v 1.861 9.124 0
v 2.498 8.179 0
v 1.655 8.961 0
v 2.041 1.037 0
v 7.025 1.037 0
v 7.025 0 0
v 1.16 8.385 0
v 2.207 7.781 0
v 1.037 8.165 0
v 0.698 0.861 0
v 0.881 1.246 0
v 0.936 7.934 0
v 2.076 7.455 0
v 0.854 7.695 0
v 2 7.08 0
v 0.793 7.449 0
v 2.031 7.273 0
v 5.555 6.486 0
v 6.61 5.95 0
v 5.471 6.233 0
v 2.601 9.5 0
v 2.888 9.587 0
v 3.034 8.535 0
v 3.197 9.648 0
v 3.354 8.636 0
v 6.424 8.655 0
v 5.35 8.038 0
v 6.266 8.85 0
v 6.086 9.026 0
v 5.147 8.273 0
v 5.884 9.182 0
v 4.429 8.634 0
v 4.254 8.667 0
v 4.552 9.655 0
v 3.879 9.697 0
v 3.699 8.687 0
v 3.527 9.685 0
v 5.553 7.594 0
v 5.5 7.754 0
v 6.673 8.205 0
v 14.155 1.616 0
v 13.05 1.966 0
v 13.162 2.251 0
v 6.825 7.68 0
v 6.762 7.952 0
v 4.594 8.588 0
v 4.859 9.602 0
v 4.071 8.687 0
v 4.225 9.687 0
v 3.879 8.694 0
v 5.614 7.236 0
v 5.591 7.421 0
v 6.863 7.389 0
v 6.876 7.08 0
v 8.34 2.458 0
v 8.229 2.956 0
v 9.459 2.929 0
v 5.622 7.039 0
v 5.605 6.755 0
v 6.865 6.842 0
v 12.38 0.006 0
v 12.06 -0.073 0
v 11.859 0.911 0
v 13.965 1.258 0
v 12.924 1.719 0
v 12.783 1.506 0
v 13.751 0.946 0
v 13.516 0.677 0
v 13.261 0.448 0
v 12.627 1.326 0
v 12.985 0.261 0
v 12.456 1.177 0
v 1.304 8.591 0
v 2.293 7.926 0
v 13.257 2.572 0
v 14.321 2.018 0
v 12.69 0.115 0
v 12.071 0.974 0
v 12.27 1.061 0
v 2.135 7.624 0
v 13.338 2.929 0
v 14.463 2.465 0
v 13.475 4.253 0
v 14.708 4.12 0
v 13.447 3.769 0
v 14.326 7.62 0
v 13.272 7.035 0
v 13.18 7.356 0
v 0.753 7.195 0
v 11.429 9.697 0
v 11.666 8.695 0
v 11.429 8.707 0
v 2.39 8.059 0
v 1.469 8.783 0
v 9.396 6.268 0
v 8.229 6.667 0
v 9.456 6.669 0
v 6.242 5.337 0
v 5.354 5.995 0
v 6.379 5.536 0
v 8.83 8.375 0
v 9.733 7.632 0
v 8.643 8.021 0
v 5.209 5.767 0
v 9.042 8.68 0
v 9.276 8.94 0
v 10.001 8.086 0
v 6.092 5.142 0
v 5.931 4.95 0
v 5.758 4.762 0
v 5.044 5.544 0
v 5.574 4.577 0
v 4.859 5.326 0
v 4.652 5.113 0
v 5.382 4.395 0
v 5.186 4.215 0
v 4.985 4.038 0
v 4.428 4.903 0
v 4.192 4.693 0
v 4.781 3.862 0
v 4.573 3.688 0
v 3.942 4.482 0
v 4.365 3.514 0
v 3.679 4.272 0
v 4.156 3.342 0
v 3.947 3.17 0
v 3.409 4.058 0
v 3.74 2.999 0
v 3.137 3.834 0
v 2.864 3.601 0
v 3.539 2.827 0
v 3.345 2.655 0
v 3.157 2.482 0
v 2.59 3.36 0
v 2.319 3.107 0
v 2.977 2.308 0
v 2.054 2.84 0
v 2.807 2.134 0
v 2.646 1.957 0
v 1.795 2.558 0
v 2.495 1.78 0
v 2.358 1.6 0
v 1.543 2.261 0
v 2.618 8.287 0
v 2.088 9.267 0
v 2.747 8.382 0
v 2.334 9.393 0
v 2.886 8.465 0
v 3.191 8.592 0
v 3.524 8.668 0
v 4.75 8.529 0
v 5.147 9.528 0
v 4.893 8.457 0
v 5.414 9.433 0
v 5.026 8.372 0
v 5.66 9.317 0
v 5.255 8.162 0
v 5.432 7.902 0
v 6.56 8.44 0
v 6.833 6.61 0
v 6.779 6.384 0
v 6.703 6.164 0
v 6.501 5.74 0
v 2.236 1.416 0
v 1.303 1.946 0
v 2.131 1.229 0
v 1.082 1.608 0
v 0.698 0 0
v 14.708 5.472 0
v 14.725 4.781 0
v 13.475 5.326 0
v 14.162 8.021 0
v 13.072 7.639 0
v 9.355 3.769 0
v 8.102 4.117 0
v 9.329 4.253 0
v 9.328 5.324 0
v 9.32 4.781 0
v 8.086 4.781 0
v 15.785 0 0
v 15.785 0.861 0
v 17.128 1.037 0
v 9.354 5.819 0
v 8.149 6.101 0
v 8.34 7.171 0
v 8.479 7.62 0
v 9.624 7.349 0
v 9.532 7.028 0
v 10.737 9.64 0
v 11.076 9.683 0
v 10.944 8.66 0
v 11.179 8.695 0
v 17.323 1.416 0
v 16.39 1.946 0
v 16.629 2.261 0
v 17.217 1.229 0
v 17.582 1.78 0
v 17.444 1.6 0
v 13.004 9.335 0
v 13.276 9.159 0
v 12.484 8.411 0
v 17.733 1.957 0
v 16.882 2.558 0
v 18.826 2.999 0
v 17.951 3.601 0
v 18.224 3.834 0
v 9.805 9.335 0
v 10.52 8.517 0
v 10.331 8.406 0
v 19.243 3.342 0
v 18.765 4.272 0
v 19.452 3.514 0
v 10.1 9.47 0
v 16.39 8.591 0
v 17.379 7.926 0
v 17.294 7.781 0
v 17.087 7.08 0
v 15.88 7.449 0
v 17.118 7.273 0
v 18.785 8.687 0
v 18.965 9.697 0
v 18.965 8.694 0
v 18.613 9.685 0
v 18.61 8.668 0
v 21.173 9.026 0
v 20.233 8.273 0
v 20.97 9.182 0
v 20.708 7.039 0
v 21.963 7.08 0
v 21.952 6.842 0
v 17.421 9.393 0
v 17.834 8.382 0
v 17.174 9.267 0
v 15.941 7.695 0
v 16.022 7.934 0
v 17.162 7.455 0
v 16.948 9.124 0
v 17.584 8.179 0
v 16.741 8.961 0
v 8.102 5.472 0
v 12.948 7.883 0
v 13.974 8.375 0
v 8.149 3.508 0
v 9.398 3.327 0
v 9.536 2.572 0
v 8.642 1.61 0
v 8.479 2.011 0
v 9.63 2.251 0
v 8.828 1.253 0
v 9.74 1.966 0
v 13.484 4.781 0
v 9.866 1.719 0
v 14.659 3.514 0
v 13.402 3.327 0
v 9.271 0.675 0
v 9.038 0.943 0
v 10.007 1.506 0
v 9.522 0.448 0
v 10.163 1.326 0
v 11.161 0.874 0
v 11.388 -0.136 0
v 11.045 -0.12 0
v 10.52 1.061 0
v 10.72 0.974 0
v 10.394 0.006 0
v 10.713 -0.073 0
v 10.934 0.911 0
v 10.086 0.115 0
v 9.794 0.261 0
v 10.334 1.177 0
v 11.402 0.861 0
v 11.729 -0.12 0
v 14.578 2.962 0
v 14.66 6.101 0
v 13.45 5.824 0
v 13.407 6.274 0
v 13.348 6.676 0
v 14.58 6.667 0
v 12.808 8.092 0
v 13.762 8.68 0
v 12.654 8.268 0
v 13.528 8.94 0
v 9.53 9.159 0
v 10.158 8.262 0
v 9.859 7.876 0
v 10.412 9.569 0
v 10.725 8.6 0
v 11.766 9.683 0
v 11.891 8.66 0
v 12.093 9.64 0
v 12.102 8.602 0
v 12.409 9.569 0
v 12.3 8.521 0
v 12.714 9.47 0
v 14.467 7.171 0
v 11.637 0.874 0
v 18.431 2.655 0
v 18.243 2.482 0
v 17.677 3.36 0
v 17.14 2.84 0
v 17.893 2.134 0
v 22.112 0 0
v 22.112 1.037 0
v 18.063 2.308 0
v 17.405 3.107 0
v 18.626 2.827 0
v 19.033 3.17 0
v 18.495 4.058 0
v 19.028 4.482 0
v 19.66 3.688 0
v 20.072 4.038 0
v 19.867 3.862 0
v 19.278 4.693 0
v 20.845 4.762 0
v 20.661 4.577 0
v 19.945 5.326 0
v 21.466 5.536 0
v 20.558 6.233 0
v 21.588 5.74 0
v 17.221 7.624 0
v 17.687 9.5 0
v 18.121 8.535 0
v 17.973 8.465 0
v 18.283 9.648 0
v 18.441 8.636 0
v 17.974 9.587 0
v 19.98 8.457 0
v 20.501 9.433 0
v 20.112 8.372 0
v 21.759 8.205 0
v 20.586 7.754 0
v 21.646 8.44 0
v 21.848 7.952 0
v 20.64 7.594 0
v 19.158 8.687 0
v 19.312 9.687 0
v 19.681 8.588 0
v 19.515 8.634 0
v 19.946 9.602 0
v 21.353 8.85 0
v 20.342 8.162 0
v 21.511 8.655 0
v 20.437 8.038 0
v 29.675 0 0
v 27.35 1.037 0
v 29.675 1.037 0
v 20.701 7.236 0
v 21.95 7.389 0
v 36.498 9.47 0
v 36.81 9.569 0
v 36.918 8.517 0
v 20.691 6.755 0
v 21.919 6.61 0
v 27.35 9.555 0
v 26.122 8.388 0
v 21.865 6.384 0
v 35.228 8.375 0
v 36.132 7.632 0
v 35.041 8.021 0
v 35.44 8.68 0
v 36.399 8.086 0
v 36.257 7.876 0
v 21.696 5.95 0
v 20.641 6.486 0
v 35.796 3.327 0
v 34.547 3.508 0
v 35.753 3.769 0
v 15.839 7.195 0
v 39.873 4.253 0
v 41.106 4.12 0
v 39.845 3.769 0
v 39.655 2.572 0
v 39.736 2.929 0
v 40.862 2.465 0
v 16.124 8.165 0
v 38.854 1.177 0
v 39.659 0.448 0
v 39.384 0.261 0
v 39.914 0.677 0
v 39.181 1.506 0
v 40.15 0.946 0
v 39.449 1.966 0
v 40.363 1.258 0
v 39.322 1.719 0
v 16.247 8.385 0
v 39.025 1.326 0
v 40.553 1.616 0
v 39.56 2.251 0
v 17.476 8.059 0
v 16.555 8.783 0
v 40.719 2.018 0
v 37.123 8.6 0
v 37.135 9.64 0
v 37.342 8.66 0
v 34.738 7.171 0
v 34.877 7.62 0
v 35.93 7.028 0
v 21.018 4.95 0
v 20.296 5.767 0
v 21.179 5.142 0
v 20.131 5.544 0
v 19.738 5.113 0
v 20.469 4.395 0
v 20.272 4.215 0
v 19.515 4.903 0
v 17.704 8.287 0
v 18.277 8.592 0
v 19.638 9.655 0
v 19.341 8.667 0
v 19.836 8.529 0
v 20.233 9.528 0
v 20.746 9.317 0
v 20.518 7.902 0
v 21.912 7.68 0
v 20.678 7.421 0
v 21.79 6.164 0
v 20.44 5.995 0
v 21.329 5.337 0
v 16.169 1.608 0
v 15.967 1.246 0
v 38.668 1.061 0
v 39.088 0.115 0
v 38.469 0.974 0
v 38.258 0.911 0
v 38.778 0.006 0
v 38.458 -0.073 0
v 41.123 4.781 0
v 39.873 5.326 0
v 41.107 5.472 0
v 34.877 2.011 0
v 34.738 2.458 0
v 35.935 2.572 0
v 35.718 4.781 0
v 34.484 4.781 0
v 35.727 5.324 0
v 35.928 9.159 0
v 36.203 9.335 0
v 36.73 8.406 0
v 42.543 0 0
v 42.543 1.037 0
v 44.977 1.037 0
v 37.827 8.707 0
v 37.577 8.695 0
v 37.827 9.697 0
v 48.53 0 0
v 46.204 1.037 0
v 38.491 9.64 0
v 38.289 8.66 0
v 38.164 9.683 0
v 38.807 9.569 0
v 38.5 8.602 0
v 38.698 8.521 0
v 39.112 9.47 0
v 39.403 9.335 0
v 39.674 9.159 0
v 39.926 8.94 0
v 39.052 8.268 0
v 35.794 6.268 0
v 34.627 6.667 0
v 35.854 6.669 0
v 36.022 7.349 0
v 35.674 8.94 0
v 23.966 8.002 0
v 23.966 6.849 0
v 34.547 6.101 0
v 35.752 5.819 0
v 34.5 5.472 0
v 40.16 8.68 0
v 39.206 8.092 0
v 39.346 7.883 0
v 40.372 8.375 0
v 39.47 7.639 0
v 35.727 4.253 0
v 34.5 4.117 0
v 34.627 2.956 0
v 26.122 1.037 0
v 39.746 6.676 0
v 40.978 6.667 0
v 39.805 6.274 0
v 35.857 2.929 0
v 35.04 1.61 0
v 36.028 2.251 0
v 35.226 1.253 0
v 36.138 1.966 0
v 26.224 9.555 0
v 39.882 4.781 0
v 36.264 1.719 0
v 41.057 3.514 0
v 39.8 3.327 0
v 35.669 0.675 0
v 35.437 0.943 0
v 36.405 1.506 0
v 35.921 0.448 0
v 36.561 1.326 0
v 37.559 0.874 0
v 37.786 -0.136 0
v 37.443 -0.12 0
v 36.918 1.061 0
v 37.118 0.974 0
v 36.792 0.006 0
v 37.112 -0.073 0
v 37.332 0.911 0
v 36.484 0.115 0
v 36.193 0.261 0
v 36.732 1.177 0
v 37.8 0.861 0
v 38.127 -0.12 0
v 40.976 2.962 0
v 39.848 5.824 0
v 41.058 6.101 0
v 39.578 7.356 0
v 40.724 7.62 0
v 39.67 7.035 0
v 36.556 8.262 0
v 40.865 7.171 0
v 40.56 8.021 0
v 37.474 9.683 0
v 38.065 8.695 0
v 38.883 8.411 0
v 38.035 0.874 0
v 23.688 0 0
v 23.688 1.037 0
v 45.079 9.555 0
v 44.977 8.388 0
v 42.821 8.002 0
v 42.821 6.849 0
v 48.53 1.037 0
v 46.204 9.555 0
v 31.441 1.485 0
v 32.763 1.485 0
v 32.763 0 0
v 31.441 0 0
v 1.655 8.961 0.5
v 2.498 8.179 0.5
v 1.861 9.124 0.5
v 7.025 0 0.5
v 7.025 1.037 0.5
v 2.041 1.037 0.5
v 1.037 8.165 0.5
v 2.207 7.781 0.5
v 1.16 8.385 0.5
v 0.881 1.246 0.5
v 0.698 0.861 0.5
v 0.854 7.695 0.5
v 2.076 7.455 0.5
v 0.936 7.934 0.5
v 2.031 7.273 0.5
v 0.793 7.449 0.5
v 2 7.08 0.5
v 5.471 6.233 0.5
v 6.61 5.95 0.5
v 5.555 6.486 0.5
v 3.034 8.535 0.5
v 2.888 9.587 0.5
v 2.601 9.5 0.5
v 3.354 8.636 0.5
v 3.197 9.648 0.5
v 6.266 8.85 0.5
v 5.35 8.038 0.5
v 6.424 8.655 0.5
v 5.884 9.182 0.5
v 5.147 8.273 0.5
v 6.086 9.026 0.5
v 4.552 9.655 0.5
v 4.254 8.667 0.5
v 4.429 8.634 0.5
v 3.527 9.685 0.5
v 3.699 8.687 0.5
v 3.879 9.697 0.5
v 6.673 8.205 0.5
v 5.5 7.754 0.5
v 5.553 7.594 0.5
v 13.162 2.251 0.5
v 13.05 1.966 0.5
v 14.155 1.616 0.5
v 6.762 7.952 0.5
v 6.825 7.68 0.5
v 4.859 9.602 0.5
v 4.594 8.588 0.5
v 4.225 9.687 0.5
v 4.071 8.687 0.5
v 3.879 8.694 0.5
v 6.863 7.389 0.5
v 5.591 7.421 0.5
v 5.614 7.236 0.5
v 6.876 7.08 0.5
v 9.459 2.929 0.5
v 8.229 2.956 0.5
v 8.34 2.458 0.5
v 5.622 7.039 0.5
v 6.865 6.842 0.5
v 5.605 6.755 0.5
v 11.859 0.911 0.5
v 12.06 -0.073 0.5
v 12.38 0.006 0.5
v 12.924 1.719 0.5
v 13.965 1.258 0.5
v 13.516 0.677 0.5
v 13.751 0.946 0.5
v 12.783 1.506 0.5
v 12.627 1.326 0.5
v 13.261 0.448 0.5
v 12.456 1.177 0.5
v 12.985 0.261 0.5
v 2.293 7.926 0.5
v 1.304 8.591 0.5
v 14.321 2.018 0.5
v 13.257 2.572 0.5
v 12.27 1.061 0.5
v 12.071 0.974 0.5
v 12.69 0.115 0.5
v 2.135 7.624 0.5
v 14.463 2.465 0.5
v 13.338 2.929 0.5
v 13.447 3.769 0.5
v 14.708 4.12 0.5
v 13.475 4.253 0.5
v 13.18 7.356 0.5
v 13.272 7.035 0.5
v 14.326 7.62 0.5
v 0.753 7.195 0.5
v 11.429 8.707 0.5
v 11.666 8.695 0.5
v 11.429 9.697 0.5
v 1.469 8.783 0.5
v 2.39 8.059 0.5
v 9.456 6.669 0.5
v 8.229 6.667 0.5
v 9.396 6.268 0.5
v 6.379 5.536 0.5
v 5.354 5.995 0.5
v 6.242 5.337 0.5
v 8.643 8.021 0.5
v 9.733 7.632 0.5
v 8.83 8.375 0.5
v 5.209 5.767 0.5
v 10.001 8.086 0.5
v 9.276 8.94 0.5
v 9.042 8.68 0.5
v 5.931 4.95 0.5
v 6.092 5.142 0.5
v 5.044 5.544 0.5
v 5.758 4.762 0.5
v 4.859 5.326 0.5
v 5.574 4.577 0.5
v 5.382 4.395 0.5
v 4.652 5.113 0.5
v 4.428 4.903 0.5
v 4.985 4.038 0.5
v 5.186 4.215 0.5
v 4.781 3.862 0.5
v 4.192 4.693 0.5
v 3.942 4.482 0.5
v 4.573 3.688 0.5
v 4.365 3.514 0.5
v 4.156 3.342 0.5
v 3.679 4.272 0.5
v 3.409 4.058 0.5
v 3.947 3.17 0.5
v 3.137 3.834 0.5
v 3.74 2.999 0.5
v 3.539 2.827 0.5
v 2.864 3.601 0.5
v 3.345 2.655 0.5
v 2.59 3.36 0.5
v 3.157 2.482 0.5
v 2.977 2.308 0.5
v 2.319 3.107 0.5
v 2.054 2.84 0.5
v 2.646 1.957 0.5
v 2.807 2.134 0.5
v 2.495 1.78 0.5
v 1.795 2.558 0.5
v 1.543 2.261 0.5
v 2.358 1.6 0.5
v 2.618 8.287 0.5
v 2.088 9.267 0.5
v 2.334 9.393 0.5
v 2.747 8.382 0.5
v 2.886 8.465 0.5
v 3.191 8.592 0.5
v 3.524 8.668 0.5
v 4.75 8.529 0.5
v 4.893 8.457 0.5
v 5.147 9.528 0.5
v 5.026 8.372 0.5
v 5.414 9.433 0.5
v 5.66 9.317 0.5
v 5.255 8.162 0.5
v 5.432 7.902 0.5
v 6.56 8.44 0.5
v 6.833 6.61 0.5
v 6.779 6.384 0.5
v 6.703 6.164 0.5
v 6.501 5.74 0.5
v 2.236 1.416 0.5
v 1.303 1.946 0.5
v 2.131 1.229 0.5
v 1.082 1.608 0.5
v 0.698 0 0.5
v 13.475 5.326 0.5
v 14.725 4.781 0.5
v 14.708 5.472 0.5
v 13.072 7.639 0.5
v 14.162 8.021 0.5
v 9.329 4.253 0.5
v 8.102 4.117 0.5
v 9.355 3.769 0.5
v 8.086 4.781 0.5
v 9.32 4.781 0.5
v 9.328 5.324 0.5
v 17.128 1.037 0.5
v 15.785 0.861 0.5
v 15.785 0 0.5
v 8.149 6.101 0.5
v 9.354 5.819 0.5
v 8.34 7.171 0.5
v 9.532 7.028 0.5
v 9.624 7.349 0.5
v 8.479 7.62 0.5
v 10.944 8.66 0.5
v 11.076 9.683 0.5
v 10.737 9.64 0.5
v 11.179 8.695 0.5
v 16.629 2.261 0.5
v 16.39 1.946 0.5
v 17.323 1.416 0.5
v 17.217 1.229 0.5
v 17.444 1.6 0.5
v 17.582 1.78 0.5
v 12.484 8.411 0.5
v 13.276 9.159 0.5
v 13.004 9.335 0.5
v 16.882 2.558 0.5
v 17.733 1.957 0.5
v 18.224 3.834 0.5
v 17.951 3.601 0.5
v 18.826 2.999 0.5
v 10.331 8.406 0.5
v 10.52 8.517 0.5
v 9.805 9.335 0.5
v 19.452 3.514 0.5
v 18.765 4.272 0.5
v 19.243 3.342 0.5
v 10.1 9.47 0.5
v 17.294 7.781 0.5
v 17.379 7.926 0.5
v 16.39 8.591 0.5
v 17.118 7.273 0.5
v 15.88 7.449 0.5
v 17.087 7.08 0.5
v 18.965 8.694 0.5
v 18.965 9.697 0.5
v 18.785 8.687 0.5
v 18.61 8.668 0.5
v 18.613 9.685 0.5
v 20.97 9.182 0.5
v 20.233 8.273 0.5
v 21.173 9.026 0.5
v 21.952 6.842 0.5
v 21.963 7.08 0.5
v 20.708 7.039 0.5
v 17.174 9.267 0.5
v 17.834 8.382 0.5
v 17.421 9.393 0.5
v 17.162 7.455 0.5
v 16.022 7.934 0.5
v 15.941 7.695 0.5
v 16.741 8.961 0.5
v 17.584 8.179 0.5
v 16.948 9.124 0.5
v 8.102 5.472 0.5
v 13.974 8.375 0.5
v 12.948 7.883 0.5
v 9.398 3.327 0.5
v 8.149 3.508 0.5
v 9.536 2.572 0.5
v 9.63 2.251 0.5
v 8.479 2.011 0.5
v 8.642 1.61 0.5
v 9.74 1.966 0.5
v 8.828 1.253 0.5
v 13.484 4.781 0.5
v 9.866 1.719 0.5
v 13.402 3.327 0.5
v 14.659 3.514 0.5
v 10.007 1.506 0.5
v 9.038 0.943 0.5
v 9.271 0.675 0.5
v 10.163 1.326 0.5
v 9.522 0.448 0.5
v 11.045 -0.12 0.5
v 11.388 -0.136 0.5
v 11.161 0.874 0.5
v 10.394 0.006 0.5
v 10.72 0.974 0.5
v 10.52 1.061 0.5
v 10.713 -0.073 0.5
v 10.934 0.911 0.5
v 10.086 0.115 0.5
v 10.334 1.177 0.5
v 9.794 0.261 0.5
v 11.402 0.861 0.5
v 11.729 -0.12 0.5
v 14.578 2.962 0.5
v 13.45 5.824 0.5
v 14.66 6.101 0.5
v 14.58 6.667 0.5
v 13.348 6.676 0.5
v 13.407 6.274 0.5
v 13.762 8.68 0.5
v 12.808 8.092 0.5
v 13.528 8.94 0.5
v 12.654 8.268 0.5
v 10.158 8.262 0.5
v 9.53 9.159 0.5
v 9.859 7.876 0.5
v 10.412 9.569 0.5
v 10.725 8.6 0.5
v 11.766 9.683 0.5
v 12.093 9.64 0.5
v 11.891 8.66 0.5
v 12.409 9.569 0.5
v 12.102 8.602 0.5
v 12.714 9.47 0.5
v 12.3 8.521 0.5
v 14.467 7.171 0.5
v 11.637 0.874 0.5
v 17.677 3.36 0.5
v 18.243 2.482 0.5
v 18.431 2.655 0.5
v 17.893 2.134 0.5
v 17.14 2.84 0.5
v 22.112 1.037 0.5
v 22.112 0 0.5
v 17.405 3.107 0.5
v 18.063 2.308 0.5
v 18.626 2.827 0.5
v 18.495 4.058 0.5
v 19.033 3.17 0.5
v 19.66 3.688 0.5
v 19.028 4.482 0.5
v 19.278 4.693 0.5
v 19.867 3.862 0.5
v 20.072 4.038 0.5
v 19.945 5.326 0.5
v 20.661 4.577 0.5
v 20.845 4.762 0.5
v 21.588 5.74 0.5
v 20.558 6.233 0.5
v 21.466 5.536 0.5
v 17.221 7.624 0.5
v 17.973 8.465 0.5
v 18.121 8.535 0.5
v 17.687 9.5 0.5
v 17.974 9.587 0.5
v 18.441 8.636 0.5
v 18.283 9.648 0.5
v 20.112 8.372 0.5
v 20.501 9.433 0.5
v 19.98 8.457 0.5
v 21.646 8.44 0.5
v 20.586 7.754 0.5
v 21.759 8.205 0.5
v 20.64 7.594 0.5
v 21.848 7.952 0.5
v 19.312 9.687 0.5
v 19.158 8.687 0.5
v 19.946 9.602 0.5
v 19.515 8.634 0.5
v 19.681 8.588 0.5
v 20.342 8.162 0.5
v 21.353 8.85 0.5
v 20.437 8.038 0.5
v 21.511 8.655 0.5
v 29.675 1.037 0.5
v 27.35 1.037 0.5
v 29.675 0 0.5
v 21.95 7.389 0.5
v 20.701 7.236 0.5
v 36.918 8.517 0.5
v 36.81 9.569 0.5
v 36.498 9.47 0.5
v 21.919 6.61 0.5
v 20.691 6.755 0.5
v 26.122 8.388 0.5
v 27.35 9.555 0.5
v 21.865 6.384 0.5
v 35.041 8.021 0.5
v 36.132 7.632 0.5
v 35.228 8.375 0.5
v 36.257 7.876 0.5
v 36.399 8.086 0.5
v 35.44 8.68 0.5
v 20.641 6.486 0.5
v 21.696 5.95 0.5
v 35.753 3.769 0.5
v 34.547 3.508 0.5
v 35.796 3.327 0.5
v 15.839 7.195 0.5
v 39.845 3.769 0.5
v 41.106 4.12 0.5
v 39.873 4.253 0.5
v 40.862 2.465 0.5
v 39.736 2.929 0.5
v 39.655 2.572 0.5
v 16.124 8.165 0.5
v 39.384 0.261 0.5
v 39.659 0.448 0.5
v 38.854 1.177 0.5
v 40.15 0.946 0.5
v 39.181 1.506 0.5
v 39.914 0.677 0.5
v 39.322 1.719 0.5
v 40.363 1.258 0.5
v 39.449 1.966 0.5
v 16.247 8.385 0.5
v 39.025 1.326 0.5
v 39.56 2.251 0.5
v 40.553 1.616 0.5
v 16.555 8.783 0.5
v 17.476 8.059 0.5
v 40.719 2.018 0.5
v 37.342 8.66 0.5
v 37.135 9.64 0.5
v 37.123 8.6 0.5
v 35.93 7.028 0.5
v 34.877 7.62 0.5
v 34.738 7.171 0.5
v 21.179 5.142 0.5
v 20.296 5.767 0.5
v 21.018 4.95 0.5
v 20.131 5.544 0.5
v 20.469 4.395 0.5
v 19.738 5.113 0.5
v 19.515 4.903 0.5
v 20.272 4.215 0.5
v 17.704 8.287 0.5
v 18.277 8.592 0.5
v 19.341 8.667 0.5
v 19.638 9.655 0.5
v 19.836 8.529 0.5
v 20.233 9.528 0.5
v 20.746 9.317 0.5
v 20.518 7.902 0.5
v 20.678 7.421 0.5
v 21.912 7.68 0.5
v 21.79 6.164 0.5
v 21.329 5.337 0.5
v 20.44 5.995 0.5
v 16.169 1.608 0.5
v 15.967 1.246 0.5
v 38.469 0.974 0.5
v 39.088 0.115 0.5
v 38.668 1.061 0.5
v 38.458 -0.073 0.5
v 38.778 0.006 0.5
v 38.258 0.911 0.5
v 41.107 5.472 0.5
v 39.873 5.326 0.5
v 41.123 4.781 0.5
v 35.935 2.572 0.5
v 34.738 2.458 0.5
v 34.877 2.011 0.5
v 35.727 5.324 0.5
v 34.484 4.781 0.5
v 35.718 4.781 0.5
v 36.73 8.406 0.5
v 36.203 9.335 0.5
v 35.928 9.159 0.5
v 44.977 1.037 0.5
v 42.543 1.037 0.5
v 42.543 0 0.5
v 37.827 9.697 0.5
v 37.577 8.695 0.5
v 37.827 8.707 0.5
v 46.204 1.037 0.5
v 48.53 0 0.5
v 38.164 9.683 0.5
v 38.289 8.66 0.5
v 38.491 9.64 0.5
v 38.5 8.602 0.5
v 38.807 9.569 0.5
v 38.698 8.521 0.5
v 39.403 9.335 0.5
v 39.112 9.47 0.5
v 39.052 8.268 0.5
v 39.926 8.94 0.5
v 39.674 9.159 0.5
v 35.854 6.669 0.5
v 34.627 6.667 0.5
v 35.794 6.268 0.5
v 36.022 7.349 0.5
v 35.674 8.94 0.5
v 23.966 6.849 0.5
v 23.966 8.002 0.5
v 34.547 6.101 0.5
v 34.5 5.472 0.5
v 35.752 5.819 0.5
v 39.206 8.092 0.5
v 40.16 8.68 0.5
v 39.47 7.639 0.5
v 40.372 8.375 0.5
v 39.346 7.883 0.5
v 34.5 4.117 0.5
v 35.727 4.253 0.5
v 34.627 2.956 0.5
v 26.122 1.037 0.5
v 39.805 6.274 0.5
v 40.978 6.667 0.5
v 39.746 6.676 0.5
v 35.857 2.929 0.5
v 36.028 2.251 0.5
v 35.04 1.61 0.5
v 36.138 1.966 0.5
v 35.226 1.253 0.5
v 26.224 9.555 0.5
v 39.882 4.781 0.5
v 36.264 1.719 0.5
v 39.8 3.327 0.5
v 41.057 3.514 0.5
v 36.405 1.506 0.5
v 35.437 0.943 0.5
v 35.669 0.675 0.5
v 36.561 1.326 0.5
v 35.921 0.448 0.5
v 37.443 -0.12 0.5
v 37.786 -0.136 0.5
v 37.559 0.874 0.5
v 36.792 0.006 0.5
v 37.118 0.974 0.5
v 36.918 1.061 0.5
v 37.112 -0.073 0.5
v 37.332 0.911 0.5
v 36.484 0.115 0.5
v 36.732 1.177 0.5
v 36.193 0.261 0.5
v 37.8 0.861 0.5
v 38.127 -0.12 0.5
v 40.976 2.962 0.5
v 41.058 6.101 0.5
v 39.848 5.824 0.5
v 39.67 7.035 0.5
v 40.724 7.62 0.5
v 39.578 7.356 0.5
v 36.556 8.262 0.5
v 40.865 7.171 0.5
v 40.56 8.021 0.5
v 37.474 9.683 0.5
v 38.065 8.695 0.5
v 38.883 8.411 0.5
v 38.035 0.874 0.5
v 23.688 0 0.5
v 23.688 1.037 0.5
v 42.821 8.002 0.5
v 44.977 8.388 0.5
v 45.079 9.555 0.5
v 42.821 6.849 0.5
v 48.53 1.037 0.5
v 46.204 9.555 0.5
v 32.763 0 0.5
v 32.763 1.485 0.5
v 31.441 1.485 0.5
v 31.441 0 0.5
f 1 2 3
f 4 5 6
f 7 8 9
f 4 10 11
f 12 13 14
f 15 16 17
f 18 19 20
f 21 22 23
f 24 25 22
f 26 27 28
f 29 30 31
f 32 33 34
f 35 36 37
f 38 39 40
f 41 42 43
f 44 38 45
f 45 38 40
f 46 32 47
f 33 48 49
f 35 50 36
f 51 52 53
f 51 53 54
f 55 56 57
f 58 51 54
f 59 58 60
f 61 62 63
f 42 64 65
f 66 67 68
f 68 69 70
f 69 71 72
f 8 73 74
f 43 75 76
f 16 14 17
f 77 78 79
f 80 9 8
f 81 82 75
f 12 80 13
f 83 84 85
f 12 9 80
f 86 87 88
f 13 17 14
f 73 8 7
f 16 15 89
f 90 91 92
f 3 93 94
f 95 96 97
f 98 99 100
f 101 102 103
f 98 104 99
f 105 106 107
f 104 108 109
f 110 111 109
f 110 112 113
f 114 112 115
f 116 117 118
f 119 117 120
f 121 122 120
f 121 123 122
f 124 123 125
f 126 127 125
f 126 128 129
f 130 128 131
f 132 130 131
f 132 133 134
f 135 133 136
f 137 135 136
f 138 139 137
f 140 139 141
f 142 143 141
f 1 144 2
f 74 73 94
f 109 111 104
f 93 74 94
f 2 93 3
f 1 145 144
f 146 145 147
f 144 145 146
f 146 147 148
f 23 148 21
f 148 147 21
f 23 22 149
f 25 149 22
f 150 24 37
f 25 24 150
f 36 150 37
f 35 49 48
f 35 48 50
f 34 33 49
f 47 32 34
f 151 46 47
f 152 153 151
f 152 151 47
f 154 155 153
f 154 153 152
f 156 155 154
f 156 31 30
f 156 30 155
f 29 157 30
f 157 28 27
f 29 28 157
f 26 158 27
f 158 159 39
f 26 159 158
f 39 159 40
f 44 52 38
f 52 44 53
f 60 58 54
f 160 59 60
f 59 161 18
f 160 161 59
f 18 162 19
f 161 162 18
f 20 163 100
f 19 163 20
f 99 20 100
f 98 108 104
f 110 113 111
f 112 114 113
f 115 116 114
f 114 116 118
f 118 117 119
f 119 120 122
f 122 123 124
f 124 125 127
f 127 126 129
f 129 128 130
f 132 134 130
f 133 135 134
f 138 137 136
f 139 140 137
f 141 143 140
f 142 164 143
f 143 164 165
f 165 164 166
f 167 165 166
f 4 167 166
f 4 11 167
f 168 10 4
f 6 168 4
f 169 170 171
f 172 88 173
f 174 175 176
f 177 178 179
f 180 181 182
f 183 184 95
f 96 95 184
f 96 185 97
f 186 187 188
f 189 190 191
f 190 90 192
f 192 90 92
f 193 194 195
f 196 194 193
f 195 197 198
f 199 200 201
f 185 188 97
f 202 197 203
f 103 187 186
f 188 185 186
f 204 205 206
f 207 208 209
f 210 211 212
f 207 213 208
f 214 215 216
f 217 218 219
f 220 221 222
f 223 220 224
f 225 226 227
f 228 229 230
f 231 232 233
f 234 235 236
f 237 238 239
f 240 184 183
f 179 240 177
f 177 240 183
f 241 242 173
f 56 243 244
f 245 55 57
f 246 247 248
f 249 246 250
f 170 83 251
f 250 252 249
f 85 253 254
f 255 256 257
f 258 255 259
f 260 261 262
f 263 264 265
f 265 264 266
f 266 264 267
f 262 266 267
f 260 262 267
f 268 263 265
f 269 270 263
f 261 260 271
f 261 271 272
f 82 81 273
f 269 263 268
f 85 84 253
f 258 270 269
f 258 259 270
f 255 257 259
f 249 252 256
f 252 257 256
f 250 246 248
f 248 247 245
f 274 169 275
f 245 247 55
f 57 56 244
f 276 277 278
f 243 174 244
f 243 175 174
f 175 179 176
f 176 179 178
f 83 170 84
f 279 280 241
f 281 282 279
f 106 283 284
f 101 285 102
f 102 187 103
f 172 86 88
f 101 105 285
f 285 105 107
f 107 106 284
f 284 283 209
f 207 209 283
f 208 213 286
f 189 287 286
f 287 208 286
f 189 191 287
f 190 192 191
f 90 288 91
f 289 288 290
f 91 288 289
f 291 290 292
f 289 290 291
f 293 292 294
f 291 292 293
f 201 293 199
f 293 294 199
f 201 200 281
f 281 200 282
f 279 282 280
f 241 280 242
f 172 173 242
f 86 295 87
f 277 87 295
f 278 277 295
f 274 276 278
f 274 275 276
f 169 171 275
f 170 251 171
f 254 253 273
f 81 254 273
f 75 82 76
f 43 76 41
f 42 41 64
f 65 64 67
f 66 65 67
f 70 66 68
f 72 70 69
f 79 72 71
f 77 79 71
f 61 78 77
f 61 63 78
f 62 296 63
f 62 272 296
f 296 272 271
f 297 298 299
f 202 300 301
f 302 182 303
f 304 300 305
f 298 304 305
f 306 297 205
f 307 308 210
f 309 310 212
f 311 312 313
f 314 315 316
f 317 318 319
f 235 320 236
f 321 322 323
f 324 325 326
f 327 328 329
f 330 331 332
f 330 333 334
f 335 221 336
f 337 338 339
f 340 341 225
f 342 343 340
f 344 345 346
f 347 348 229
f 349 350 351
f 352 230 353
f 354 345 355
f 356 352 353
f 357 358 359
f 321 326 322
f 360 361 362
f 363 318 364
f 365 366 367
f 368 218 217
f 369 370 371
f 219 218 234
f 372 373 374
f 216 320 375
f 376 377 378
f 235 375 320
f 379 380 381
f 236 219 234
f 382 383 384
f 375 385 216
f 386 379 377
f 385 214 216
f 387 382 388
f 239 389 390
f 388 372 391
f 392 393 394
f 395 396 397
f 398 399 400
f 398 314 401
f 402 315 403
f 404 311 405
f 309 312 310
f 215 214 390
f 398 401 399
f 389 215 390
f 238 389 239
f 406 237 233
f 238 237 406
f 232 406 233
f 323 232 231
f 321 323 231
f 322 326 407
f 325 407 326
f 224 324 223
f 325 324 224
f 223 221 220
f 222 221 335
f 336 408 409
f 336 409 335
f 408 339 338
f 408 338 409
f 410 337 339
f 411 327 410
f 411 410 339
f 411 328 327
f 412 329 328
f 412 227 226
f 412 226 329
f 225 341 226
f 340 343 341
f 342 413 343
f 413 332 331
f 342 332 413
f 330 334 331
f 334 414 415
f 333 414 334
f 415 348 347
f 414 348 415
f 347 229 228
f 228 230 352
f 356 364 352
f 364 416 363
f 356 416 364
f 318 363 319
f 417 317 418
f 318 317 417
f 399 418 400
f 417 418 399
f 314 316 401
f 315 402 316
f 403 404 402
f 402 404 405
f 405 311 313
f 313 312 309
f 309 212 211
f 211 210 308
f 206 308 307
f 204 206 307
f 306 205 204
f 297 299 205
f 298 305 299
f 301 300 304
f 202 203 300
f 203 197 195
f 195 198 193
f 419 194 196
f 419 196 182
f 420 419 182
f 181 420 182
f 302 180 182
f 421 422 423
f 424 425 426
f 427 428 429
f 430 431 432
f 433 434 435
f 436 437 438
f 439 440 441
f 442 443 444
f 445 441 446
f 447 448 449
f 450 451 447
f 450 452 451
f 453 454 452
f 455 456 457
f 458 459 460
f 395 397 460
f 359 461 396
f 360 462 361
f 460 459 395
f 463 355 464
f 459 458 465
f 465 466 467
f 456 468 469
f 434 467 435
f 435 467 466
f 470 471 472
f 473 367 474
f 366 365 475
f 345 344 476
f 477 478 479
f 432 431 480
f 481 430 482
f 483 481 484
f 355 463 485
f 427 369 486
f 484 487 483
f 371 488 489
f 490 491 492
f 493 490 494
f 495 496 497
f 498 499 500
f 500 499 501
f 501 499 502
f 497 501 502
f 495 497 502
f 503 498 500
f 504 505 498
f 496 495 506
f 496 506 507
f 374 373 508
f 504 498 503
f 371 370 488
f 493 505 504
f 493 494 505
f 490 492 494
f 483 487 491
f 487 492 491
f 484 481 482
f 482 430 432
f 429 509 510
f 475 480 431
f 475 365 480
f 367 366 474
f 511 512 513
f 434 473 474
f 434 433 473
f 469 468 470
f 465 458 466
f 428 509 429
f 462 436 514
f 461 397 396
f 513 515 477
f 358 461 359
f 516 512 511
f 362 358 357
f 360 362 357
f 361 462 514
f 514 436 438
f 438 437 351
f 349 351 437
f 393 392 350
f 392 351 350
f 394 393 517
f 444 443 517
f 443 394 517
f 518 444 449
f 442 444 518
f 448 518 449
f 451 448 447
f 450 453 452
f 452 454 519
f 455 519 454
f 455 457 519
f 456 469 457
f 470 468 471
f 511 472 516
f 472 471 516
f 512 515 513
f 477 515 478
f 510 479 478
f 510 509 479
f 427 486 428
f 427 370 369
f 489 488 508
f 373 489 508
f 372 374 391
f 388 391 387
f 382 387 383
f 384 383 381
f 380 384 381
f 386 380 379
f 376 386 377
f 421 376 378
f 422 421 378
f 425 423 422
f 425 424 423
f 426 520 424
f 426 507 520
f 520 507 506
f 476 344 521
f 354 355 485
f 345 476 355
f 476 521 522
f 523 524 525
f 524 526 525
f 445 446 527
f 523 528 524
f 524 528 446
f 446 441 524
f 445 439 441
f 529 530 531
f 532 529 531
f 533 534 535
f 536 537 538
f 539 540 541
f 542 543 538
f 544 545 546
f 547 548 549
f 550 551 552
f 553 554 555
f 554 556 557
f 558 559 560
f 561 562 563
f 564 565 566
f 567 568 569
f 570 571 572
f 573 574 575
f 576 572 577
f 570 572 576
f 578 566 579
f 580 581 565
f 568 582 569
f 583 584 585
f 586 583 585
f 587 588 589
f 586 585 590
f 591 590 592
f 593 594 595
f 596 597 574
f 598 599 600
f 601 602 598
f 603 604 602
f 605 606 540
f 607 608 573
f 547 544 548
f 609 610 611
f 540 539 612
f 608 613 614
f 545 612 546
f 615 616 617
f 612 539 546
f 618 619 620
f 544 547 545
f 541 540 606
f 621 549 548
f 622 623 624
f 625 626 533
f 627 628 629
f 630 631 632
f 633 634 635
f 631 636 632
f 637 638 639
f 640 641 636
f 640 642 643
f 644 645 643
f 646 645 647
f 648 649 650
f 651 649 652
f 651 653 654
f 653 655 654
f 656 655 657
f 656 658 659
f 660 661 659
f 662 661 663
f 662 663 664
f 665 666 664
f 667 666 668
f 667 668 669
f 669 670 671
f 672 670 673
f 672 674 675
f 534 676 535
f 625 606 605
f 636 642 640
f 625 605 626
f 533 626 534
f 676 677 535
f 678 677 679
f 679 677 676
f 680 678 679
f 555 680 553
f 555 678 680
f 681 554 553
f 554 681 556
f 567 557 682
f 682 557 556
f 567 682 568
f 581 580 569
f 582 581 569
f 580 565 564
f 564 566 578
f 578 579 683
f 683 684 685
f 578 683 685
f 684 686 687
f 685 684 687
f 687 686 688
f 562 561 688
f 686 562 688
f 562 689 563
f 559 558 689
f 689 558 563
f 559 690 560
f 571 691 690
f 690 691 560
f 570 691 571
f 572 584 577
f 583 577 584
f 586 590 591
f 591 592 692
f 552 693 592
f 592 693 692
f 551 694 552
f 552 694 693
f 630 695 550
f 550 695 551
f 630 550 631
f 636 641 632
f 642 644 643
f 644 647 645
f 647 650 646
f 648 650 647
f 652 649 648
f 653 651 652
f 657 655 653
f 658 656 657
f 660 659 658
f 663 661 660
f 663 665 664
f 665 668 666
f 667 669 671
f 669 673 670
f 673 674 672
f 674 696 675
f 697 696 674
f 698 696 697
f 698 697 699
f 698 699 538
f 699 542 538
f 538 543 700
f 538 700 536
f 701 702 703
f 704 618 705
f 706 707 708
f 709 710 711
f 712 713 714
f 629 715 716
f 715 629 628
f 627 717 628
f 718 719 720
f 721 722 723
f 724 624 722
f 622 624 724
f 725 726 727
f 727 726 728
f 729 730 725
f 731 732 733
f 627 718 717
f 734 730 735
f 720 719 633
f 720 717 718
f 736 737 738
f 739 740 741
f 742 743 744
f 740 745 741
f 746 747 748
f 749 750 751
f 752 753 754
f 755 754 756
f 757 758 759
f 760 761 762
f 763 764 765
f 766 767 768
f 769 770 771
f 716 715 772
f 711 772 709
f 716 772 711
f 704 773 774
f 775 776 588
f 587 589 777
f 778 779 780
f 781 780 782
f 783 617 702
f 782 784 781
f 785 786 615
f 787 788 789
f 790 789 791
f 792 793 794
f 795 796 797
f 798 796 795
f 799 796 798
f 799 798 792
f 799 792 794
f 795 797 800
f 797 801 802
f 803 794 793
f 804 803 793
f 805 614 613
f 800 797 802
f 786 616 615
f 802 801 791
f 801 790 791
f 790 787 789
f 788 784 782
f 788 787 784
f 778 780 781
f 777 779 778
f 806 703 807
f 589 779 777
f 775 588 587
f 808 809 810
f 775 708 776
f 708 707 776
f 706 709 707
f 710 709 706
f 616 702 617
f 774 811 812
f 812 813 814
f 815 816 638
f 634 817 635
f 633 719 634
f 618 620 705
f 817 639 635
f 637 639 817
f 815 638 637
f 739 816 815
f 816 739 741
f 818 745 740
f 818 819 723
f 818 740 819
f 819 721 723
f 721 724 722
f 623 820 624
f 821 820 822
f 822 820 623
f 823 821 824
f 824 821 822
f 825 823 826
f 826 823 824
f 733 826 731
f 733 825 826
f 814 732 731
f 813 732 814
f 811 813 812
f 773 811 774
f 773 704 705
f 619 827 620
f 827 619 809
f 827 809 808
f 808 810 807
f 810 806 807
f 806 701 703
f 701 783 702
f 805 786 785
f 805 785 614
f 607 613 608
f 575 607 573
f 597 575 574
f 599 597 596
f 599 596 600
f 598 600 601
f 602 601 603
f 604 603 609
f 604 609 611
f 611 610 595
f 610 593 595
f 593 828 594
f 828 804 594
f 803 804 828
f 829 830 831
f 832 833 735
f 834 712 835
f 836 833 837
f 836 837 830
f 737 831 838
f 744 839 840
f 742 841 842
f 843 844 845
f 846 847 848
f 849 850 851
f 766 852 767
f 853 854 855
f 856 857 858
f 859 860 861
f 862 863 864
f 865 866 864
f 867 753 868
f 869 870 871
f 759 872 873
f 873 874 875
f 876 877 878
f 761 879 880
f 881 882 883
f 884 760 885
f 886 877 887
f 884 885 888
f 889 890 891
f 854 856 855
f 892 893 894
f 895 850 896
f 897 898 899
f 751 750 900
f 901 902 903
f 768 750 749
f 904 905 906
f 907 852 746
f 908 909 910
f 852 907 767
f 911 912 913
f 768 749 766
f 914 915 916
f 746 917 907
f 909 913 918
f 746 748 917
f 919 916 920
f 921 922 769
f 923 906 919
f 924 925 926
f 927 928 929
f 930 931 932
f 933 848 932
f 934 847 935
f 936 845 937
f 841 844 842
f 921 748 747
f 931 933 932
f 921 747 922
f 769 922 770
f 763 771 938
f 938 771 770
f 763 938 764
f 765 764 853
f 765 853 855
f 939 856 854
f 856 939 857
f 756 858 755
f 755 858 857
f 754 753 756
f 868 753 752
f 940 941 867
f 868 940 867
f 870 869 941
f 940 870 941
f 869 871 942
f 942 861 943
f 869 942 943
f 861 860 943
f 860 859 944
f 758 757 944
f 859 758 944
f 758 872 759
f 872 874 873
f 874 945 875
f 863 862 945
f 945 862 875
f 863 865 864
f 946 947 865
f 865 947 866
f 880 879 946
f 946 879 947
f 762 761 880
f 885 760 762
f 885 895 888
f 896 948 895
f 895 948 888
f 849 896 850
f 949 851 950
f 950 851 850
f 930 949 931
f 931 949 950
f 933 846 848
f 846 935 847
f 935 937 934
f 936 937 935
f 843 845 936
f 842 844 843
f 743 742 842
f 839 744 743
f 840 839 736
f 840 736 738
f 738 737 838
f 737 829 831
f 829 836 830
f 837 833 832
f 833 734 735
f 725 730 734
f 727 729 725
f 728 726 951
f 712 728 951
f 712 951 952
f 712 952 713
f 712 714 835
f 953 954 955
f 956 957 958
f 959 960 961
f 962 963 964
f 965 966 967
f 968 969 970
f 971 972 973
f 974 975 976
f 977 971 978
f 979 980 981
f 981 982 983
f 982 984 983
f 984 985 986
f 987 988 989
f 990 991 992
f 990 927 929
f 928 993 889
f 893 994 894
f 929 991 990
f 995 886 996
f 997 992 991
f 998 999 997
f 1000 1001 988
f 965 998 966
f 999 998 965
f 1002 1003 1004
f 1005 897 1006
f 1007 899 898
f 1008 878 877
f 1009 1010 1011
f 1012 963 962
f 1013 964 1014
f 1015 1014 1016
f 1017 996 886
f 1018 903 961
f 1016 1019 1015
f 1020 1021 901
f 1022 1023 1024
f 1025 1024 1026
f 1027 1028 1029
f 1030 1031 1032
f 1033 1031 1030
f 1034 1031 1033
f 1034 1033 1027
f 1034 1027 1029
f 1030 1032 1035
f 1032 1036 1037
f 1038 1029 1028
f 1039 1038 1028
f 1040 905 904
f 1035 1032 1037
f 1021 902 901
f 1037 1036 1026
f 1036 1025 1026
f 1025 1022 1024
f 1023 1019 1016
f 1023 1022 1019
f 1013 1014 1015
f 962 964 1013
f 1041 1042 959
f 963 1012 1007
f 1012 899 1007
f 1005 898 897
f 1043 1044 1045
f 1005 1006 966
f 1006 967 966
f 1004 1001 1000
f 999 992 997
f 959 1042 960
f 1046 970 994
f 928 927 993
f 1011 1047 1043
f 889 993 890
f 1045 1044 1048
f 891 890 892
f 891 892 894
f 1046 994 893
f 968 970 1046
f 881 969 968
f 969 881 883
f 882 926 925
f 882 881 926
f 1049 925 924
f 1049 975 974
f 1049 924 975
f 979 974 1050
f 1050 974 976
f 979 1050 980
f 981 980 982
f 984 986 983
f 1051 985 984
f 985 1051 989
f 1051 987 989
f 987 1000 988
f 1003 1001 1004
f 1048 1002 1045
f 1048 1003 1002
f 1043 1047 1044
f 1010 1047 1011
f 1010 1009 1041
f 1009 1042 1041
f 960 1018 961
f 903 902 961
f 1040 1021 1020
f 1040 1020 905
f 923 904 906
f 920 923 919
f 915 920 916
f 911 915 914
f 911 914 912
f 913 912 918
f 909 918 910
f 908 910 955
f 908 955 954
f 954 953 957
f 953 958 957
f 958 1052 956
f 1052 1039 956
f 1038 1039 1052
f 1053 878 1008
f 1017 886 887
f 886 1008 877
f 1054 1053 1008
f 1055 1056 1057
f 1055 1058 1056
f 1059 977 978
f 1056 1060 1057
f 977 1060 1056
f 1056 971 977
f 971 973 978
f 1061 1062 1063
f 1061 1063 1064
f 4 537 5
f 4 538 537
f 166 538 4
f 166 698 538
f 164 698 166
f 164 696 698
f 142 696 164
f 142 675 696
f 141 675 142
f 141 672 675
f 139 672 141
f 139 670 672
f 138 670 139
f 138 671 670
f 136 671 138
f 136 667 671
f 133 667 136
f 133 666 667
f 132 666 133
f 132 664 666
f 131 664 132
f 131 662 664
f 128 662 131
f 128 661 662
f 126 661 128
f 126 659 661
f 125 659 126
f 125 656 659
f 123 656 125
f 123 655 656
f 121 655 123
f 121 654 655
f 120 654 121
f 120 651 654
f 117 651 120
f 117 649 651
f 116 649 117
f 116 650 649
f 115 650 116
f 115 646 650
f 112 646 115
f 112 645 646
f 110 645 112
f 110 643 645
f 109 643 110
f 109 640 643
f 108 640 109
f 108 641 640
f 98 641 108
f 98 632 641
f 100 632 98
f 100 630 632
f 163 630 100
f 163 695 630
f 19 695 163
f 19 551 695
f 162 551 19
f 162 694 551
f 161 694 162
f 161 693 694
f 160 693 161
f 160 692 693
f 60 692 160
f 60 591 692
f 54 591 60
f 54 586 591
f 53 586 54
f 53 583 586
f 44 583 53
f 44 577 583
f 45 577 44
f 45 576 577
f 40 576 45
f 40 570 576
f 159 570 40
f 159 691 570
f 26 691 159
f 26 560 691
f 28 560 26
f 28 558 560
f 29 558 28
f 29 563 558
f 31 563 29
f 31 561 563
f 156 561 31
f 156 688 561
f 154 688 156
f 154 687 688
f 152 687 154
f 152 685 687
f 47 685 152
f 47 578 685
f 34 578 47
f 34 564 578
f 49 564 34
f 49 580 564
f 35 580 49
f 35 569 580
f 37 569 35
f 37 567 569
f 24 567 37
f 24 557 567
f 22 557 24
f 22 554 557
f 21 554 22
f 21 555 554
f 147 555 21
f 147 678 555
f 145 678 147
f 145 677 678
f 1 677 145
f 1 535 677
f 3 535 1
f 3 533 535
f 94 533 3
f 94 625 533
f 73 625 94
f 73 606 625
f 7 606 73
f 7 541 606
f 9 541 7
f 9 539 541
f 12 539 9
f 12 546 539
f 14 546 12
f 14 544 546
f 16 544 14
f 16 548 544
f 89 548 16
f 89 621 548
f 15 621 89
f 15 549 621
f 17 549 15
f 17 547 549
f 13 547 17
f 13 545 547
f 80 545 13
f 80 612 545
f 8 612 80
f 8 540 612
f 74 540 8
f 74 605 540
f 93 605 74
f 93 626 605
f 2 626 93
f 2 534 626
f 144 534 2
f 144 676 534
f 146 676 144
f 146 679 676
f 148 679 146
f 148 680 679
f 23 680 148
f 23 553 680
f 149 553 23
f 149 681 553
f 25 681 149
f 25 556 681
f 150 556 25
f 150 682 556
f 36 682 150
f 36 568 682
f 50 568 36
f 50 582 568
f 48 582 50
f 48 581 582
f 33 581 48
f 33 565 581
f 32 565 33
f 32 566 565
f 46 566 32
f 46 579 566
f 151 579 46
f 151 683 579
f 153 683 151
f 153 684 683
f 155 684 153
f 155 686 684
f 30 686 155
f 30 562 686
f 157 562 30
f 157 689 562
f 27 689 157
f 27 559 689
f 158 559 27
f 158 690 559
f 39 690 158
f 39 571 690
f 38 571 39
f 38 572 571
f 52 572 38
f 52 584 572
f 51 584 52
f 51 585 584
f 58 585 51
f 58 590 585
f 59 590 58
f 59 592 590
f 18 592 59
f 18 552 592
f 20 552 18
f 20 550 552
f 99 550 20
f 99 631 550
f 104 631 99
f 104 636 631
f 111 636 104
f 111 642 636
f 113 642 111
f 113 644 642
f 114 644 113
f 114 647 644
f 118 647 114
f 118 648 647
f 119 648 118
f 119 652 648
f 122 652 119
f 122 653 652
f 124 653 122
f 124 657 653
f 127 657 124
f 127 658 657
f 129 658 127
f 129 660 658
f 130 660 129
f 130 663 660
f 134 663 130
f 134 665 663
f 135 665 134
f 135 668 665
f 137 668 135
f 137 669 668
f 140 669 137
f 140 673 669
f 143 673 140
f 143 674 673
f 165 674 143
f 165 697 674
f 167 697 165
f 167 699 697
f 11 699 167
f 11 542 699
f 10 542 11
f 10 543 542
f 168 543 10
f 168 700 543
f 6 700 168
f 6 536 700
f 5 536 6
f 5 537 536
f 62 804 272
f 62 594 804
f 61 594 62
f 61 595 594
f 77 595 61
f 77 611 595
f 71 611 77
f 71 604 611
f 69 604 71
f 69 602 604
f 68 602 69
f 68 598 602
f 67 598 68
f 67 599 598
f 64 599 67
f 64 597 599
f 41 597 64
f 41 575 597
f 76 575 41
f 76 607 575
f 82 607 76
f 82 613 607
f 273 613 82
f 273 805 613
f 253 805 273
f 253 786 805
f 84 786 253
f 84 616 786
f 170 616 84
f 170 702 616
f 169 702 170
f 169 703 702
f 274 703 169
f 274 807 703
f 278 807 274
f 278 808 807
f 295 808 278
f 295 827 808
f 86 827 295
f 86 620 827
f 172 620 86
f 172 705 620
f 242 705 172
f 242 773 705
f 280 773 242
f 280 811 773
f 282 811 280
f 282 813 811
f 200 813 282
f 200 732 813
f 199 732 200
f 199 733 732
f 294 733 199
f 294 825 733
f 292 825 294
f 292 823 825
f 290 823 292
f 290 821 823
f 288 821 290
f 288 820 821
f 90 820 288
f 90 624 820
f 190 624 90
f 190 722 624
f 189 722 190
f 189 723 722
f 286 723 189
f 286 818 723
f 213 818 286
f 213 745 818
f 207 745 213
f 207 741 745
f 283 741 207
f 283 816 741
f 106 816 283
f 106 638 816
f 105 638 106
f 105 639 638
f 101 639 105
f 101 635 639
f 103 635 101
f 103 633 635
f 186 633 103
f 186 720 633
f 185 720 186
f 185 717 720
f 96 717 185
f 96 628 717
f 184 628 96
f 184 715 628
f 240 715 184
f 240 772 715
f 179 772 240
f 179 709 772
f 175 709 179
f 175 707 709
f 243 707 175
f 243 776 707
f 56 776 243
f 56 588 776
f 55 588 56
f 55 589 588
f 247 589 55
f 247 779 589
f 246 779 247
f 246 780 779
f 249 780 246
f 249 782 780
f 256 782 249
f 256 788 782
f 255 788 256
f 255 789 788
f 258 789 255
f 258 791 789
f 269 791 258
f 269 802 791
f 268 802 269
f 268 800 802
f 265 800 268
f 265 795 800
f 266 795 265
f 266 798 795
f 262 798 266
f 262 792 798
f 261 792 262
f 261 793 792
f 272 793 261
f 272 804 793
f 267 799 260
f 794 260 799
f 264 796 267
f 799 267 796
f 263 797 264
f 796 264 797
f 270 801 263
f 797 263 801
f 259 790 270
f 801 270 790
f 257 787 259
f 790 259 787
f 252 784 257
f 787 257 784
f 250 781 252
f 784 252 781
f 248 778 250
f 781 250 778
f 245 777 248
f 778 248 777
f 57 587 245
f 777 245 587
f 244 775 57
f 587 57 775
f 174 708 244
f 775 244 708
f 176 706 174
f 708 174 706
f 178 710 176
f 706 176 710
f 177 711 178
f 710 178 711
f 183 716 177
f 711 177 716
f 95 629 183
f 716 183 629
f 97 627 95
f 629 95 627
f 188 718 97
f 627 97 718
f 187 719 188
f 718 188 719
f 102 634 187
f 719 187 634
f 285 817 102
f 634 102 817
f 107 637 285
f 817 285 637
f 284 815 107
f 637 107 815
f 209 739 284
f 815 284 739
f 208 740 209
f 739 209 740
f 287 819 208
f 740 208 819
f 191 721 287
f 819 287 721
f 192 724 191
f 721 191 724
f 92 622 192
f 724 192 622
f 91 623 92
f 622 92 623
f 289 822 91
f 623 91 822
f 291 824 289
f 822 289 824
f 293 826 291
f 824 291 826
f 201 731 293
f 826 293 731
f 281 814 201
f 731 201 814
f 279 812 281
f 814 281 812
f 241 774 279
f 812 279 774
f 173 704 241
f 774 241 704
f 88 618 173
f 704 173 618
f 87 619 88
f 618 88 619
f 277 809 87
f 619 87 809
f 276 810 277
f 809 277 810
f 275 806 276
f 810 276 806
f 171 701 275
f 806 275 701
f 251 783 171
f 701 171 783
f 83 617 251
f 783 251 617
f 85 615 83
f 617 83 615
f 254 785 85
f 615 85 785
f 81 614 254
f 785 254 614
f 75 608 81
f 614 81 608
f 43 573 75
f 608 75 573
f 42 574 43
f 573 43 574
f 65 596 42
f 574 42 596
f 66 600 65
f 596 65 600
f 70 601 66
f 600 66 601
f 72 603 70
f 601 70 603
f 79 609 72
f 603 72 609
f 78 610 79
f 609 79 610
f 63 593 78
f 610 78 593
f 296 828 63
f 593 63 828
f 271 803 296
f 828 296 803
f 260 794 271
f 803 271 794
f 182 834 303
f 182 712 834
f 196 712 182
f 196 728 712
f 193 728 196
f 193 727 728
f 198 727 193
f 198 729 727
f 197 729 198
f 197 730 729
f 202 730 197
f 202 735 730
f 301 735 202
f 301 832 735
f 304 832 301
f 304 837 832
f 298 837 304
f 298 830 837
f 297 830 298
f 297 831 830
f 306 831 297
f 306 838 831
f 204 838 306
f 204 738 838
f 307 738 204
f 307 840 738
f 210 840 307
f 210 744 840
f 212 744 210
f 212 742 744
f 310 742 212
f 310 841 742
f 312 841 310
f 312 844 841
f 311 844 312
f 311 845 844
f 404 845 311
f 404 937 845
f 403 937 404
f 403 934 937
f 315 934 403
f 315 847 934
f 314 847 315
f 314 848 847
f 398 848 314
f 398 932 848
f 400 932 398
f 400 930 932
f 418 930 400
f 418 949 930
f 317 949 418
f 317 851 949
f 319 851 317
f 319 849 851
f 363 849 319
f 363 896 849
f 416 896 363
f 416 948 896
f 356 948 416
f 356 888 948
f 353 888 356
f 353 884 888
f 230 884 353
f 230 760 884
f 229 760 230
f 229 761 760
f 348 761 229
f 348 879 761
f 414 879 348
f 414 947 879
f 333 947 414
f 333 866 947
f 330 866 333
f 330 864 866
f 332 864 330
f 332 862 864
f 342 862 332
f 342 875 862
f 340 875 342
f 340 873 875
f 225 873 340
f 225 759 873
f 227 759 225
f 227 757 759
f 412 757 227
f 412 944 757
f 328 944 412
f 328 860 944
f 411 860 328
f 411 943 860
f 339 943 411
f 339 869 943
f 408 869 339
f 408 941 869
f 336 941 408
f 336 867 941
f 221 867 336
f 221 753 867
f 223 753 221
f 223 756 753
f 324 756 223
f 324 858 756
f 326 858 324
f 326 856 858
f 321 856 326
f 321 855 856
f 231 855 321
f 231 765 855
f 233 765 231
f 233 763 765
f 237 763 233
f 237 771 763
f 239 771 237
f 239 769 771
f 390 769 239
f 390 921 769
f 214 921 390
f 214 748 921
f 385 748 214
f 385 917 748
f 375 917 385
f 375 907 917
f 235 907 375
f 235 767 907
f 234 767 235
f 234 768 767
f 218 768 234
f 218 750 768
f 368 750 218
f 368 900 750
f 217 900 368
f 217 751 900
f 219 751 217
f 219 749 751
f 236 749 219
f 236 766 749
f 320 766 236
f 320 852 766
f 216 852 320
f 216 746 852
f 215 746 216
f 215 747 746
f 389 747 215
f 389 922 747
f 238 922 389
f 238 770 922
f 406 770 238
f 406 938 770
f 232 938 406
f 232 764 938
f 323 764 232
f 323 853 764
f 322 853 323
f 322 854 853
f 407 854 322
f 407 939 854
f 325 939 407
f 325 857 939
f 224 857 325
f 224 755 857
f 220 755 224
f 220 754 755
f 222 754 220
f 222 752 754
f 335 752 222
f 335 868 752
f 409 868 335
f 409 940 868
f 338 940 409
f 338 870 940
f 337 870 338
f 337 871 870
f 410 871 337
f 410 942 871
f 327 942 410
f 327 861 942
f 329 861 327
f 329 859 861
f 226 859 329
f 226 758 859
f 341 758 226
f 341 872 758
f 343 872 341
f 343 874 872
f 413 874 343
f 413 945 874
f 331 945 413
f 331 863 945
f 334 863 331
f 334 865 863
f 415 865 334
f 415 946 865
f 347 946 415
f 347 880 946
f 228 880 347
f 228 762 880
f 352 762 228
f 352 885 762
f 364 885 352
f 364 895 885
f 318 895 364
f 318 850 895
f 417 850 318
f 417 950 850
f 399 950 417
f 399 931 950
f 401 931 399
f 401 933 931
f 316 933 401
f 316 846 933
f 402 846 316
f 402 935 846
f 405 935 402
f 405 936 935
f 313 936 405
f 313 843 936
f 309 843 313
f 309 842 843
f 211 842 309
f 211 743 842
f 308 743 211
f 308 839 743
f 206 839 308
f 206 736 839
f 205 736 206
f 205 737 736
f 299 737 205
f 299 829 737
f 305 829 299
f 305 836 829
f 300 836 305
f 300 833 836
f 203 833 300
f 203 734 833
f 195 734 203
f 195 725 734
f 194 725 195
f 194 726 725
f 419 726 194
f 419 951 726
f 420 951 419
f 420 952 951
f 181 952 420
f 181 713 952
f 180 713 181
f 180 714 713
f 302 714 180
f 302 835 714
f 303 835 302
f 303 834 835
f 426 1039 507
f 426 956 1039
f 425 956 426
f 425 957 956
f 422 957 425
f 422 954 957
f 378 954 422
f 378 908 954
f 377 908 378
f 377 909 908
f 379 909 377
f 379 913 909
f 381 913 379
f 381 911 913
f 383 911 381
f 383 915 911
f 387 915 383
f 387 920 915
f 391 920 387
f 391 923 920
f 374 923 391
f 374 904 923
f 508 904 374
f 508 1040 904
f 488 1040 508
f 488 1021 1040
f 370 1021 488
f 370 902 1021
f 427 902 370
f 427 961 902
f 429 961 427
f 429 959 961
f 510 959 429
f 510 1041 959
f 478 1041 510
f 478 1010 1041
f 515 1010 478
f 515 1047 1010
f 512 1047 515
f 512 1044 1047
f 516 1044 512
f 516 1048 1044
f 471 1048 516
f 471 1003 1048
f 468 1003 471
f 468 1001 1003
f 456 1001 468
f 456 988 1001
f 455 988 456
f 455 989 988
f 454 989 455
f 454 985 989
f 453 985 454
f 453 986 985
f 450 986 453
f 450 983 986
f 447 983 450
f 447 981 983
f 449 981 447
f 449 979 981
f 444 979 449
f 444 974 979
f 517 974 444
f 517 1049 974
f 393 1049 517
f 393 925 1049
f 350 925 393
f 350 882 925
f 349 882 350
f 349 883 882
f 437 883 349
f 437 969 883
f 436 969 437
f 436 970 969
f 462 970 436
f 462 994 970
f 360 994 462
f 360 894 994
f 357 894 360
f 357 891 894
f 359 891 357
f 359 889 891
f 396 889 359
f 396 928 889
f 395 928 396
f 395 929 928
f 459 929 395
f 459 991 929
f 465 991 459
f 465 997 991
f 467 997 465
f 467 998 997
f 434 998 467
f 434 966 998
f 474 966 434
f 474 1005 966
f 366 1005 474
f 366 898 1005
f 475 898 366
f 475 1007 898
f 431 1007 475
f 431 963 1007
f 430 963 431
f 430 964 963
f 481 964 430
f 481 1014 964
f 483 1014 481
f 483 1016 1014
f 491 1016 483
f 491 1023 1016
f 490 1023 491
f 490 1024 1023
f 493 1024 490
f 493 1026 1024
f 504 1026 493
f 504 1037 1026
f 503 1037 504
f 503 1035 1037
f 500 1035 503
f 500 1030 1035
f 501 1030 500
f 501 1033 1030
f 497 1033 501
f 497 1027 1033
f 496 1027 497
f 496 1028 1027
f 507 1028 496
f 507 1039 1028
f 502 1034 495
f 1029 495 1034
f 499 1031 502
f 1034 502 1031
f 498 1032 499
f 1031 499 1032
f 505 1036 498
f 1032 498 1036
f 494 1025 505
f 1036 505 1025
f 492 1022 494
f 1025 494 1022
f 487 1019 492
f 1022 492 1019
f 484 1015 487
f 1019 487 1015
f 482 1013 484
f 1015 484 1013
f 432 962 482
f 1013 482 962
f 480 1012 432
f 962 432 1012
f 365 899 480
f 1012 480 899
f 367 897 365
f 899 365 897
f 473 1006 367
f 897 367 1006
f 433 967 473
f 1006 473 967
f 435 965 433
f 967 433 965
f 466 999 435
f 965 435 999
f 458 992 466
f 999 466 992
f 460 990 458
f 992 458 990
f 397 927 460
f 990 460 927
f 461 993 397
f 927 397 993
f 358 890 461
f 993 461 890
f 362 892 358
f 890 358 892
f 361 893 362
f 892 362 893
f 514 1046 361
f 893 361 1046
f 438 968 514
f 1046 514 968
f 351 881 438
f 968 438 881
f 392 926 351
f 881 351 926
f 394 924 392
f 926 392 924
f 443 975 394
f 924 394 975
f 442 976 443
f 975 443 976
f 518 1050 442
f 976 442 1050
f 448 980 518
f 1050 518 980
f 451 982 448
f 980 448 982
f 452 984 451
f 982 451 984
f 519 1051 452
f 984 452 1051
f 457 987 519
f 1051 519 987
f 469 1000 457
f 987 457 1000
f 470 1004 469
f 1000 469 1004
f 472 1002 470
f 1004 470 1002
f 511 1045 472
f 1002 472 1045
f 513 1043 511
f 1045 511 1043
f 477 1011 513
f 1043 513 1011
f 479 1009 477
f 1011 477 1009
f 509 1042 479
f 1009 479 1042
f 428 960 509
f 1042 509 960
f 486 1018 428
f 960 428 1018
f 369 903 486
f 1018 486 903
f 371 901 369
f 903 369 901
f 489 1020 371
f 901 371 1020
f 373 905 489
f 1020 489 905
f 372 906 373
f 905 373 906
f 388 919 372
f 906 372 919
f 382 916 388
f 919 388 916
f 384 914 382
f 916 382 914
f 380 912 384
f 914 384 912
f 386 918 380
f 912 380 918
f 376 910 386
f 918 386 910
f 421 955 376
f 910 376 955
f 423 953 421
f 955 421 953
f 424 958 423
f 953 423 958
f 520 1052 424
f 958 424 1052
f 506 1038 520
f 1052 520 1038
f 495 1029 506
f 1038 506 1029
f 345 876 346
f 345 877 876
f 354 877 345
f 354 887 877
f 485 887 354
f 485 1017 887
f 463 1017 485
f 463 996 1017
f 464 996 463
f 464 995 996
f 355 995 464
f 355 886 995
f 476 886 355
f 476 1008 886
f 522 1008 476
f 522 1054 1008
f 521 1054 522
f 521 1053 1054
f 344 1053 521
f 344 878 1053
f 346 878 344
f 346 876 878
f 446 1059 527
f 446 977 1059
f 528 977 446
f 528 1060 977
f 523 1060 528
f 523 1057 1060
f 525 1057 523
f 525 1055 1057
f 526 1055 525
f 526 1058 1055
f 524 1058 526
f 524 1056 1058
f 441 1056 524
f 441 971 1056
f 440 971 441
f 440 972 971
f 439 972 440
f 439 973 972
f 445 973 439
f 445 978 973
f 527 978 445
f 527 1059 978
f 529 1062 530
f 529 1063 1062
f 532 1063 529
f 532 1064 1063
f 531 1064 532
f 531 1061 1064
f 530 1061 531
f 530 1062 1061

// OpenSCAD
linear_extrude(height=0.5) {
  text(str(version_num()/10000));
}
